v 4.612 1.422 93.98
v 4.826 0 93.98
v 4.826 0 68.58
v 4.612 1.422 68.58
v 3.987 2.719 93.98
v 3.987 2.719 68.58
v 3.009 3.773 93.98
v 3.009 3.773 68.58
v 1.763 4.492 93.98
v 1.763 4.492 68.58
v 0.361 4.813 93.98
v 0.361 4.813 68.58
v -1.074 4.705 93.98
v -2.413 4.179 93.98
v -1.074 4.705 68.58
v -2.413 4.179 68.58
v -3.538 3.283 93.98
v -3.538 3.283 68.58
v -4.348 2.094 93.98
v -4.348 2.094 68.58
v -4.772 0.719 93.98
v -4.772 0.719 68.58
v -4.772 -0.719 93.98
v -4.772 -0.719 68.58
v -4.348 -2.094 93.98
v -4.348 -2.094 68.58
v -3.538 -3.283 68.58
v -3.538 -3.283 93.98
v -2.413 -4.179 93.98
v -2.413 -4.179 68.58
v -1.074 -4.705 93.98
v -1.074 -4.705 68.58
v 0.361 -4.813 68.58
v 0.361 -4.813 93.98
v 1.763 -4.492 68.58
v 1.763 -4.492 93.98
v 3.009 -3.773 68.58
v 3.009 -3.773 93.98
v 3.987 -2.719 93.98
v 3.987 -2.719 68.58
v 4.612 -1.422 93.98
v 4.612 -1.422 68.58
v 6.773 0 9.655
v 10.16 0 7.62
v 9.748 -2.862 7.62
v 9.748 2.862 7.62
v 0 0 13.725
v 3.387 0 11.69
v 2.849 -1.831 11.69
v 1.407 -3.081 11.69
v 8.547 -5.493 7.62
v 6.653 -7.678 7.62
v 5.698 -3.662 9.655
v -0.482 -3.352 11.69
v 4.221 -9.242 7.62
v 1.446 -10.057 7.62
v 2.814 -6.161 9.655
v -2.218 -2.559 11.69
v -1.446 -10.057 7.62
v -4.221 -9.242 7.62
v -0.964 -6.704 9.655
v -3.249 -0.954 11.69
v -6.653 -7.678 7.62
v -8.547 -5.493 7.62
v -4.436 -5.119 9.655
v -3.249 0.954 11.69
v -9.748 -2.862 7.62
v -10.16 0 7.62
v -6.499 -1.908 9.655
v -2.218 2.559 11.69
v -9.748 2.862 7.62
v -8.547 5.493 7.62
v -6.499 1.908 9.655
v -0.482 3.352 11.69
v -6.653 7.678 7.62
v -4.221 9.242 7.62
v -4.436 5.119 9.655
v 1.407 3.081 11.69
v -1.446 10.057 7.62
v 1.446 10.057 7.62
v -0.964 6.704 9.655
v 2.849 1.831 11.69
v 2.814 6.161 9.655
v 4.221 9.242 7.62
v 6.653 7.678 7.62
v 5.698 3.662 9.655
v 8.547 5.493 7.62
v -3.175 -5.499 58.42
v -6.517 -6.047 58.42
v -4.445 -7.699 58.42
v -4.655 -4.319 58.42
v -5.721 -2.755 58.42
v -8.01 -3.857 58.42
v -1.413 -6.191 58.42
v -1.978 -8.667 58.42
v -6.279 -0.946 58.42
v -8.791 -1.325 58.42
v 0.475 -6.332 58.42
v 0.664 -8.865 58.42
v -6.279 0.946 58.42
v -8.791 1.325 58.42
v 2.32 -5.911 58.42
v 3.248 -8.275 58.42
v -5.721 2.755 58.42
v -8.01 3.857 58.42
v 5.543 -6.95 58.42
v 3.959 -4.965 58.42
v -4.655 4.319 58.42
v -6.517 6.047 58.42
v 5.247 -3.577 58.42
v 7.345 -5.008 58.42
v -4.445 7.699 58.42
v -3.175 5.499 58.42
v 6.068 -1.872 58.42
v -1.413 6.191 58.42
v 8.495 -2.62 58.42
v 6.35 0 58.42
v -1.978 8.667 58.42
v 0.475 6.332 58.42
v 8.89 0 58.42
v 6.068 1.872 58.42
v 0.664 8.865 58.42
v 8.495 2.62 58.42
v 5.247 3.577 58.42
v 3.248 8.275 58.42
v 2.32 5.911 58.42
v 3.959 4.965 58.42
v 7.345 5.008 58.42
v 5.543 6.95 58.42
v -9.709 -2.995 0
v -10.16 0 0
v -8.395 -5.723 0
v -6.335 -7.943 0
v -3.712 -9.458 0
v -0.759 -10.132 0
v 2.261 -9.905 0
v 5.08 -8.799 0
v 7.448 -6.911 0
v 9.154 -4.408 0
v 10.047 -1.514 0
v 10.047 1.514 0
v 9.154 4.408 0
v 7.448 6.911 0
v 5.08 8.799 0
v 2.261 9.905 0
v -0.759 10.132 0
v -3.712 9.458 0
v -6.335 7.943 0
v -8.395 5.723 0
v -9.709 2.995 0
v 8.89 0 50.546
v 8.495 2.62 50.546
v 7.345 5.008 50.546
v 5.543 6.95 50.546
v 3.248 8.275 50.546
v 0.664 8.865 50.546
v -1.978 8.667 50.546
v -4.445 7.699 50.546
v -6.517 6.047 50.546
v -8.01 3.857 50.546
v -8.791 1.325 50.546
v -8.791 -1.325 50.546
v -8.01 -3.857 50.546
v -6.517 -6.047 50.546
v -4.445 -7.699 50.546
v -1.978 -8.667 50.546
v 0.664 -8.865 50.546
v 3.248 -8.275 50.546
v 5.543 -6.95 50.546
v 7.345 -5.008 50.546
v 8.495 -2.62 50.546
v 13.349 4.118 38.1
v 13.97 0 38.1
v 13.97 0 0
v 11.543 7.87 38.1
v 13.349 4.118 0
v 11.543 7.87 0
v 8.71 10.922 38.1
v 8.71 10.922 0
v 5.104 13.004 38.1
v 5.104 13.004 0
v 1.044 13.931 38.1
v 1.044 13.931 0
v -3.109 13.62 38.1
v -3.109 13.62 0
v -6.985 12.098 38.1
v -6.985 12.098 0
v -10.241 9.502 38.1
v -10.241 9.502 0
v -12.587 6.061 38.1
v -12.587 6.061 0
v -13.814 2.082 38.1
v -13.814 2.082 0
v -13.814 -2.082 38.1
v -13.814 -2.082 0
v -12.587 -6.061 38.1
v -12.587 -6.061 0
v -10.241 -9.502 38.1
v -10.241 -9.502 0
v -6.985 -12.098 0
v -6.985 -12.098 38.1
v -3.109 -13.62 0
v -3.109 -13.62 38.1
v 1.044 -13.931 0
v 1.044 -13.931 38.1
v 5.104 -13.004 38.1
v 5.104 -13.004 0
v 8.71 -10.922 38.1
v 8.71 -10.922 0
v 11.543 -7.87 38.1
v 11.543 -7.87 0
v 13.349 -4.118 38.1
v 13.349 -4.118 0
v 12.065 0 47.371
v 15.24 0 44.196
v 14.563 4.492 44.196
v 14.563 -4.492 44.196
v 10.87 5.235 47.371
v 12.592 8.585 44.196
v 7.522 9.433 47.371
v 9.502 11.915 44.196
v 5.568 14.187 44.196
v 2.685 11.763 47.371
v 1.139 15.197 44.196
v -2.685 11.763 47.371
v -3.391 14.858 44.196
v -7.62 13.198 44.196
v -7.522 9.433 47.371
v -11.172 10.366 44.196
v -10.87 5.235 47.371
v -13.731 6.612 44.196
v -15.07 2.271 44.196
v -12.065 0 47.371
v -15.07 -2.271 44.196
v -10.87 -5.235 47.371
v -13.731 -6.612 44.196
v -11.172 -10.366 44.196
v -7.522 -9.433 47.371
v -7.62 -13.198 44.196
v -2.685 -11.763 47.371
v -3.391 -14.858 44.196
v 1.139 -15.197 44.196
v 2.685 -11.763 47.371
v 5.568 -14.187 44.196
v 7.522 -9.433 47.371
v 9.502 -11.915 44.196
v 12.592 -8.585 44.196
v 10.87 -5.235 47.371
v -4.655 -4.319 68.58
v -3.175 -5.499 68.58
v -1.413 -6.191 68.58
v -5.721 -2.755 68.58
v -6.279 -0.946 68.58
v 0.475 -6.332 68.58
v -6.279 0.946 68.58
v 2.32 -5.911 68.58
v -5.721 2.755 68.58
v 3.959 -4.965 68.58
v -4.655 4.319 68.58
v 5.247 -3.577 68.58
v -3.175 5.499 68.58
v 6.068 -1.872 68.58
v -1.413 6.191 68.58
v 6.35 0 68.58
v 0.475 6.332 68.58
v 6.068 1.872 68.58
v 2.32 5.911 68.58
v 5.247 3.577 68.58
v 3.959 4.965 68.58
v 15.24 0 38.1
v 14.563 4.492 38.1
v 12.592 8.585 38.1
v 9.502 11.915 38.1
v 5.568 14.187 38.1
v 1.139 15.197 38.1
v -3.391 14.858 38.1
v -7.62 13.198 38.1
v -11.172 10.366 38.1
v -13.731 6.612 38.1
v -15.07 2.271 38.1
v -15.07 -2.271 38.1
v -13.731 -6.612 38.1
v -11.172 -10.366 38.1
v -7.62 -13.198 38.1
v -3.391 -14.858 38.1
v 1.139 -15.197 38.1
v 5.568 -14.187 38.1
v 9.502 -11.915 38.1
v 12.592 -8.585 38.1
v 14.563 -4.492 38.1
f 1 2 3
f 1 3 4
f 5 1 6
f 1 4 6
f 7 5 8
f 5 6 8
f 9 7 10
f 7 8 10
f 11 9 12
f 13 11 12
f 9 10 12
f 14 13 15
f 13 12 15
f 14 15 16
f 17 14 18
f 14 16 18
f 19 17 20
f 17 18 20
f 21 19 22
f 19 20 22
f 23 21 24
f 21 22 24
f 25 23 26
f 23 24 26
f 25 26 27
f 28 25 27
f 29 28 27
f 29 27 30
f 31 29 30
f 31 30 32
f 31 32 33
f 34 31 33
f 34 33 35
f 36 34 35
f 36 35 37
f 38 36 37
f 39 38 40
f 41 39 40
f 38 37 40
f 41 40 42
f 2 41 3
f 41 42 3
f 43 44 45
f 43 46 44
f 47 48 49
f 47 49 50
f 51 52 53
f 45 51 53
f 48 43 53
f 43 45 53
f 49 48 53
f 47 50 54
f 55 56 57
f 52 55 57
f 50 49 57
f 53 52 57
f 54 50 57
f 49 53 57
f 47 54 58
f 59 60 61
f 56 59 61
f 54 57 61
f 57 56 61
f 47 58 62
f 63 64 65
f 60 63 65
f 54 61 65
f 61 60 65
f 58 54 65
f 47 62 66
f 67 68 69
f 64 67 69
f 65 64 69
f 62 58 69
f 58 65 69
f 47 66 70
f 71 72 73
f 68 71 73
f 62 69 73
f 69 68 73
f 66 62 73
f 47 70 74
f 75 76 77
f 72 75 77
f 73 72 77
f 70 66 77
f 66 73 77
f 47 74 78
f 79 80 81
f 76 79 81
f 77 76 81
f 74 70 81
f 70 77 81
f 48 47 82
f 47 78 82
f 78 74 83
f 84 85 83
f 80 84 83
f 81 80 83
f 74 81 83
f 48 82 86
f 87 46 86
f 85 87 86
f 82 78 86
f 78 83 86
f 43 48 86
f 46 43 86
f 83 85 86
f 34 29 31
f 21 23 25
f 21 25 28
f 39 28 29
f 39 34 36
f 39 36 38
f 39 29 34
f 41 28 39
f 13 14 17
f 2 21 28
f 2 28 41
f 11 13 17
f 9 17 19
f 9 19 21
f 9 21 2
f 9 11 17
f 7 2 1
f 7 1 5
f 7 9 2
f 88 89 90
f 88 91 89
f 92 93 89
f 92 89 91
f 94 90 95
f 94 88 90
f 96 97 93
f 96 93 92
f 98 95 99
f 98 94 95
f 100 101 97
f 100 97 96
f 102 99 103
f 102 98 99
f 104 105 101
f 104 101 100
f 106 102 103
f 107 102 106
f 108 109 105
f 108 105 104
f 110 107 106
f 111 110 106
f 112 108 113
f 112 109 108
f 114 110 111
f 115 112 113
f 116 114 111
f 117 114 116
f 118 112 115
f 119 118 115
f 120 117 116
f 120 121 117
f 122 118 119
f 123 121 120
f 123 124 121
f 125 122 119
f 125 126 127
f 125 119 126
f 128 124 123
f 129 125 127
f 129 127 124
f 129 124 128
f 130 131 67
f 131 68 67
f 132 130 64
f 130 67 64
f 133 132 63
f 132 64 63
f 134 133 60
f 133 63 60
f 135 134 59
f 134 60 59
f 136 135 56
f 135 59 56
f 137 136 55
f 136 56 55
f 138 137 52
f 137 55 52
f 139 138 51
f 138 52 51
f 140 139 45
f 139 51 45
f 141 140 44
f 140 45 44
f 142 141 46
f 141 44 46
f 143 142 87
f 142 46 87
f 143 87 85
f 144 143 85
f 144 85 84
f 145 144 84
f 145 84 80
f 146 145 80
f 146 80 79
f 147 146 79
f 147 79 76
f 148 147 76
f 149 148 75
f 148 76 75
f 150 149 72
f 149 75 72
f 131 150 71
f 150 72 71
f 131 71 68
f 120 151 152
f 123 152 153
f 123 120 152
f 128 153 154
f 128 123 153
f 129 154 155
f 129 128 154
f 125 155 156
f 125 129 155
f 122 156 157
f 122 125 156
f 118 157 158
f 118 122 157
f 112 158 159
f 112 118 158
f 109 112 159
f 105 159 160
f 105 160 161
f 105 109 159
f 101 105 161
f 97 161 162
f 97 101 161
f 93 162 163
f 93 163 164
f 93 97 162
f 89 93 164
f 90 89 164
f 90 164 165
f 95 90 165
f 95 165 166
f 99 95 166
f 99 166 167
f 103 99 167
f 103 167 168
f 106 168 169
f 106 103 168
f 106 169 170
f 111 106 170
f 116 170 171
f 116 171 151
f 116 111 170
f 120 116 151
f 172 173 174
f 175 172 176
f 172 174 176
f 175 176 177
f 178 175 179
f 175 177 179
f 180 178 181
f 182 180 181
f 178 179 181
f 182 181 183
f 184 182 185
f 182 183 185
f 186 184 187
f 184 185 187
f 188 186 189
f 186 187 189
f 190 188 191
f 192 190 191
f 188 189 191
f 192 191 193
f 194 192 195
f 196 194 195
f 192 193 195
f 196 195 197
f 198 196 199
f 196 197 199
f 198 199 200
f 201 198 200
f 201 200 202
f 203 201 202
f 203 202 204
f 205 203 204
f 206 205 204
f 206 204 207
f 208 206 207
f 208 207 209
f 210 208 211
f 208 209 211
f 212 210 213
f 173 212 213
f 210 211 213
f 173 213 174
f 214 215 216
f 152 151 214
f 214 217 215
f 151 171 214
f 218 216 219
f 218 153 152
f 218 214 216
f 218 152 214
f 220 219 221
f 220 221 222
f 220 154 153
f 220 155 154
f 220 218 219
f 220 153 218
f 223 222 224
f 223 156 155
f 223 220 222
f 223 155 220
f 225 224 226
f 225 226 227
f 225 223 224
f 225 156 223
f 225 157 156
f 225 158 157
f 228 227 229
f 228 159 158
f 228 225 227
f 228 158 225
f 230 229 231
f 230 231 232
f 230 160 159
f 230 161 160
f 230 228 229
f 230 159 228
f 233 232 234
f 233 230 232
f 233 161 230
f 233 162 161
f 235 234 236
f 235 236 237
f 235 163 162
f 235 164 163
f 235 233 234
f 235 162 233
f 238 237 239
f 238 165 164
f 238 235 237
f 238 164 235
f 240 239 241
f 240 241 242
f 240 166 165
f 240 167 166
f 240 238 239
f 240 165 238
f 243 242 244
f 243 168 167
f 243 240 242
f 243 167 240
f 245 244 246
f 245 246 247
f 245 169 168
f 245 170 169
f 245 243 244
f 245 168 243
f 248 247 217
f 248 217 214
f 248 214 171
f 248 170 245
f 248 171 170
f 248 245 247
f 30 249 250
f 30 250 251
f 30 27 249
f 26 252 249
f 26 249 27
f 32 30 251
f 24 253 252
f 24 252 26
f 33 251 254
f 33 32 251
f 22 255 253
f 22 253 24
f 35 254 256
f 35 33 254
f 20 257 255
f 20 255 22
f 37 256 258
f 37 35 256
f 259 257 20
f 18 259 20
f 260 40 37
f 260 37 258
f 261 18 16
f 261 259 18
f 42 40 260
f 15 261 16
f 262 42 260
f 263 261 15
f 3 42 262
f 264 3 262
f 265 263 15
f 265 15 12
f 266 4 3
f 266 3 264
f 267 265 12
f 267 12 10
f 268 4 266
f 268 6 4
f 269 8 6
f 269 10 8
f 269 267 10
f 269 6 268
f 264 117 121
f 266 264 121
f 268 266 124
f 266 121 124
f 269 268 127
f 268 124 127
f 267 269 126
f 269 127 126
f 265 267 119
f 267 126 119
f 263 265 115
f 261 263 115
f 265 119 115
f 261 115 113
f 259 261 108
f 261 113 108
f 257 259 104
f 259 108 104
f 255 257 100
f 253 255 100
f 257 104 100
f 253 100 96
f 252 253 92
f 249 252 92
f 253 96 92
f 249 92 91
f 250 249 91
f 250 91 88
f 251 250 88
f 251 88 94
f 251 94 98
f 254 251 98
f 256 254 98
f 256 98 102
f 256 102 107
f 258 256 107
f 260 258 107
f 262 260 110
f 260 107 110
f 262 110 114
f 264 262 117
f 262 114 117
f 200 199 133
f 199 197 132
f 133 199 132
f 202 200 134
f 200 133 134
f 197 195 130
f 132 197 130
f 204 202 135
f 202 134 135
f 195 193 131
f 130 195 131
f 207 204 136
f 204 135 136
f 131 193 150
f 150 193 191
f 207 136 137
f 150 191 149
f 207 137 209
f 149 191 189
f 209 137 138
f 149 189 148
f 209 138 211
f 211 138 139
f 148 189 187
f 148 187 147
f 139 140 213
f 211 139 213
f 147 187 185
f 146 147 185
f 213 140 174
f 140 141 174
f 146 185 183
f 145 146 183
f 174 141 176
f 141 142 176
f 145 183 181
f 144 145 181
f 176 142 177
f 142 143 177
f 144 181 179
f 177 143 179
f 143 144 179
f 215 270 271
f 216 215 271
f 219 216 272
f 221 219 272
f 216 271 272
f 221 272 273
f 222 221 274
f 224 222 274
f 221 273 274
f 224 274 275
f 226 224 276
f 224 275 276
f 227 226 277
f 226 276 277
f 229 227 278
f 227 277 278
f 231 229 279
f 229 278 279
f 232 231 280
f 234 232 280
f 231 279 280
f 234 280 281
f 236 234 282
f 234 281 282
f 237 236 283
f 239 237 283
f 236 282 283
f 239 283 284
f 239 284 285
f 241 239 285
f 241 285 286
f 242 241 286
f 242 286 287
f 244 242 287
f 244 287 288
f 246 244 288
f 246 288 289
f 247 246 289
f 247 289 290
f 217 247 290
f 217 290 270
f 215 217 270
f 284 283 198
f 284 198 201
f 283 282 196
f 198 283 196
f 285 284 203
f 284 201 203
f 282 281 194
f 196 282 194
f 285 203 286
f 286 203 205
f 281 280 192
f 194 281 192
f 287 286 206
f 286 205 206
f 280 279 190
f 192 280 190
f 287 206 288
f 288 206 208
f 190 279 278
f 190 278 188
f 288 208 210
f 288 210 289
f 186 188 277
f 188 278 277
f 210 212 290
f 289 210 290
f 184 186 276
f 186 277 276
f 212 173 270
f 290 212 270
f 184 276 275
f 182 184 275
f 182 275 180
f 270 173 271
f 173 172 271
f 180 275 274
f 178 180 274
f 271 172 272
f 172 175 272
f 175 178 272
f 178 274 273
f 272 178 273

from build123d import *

# Parameters (mm, degrees)
F0_R         = 13.97
F1_DEPTH     = 38.1
F2_R         = 15.24
F3_DEPTH     = 12.7
F4_R         = 8.89
F5_DEPTH     = 7.62
F6_R         = 6.35
F7_DEPTH     = 10.16
F8_R         = 4.826
F9_DEPTH     = 25.4
F10_S5_R     = 8.89
F10_T6_DEPTH = 23
F12_D        = 20.32
F12_DEPTH    = 7.62
F12_TIP      = 6.1047438893


# Not quite as in the source:
# - a fillet or chamfer that OpenCascade refuses, or shapes differently, is made with other operations: its cross-section is extruded or revolved along the edge and cut away or added


with BuildPart() as f1:
    # F0 (on Top) → F1 (new body)
    with BuildSketch(Plane.XY):
        Circle(F0_R)
    extrude(amount=F1_DEPTH)

    # F2 (on face) → F3 (join)
    with BuildSketch(Plane.XY.offset(38.1)):
        Circle(F2_R)
    extrude(amount=F3_DEPTH)

    # F4 (on face) → F5 (join)
    with BuildSketch(Plane.XY.offset(50.8)):
        Circle(F4_R)
    extrude(amount=F5_DEPTH)

    # F6 (on face) → F7 (join)
    with BuildSketch(Plane.XY.offset(58.42)):
        Circle(F6_R)
    extrude(amount=F7_DEPTH)

    # F8 (on face) → F9 (join)
    with BuildSketch(Plane.XY.offset(68.58)):
        Circle(F8_R)
    extrude(amount=F9_DEPTH)

    # F10: chamfer of 6.604 on 1 edges, made by hand


with BuildPart() as f10_tool2:
    # F10_s3 → F10_t4 (revolve)
    with BuildSketch(Plane.XZ):
        Polygon((15.24, 44.196), (8.636, 50.8), (15.24, 50.8), align=None)
    revolve(axis=Axis((0, 0, 50.8), (0, 0, 1)))

    # F10_s5 → F10_t6 (cut, symmetric)
    with BuildSketch(Plane.XY.offset(47.5)):
        Circle(F10_S5_R)
    extrude(amount=F10_T6_DEPTH, both=True, mode=Mode.SUBTRACT)


with BuildPart() as f1_1:
    add(f1.part)

    # F10_t1: cut F10_tool2
    add(f10_tool2.part, mode=Mode.SUBTRACT)

    # F12
    with Locations(Plane(origin=(0, 0, 0), x_dir=(1, 0, 0), z_dir=(0, 0, -1))):
        with Locations((0, 0)):
            Hole(F12_D / 2, depth=F12_DEPTH)
            with Locations((0, 0, -(F12_DEPTH + F12_TIP / 2))):  # 118° drill point
                Cone(0, F12_D / 2, F12_TIP, mode=Mode.SUBTRACT)


solid = f1_1.part
